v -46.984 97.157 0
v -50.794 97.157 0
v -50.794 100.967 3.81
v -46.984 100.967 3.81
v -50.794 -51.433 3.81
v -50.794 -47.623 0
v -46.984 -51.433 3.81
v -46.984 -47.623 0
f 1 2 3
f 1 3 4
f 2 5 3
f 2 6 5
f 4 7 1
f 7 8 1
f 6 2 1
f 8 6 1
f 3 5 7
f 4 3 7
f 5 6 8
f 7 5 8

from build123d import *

# Parameters (mm, degrees)
F0_W     = 3.81
F0_H     = 152.4
F1_DEPTH = 3.81
F2_SIZE  = 3.80999
F3_SIZE  = 3.80999


# Not quite as in the source:
# - a fillet or chamfer is up to 0.001 mm smaller than in the source, because OpenCascade refuses the exact size


with BuildPart() as f1:
    # F0 (on Top) → F1 (new body)
    with BuildSketch(Plane.XY):
        with Locations((-48.8890688866, 24.7670258315)):
            Rectangle(F0_W, F0_H)
    extrude(amount=F1_DEPTH)

    # F2 (size 3.81 in the source; OpenCascade refuses exactly that, so slightly less here)
    f2_edges = [f1.edges().sort_by_distance(p)[0] for p in [
        (-48.889069, -51.432974, 0),
    ]]
    chamfer(f2_edges, length=F2_SIZE)

    # F3 (size 3.81 in the source; OpenCascade refuses exactly that, so slightly less here)
    f3_edges = [f1.edges().sort_by_distance(p)[0] for p in [
        (-48.889069, 100.967026, 0),
    ]]
    chamfer(f3_edges, length=F3_SIZE)


solid = f1.part
